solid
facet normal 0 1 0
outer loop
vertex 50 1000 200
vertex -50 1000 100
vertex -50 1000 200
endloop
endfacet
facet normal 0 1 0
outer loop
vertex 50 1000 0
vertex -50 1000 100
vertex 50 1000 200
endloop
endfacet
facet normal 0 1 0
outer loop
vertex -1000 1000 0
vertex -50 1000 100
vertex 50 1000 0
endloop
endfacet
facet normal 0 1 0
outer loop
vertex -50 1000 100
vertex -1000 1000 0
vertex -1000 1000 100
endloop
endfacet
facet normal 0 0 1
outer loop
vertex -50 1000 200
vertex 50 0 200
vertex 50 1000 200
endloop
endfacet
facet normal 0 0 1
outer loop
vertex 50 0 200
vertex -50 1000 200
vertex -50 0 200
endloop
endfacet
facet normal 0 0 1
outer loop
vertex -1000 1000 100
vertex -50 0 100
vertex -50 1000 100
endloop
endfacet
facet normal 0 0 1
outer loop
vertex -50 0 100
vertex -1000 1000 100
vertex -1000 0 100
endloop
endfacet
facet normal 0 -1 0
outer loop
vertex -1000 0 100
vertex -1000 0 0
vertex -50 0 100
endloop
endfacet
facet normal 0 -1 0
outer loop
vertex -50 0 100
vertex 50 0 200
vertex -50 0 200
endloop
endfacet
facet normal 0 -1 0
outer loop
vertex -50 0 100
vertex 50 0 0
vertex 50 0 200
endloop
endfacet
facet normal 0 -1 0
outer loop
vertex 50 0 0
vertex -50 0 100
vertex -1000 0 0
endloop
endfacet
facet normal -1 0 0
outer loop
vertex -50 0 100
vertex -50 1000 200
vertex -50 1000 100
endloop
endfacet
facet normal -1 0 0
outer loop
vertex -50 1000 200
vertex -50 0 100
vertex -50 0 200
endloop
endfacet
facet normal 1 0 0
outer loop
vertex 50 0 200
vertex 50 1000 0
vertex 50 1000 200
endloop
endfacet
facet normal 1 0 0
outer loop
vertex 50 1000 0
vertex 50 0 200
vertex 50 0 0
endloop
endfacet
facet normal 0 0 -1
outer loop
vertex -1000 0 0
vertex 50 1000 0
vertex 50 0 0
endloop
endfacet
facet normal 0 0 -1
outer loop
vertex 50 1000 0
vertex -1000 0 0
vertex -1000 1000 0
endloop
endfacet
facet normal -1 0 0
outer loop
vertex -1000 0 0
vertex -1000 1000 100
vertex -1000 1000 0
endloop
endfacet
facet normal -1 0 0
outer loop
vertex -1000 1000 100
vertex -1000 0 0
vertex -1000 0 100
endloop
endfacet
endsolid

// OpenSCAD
// file: ../../libs/basic-dims.scad
unit = 1000;

section_width = unit;
section_height = unit * 2;
section_thickness = unit * 0.1;

rt = sqrt(2);

//  -- Notes --
//  Z is UP
//  X is FORWARD (out of the screen)
// file: ../../libs/templates/t_flat-roof.scad
include <../basic-dims.scad>

flat_roof_wall_offset = section_thickness/2;

module flat_roof_straight() {
    rotate([0, 0, 90])
    translate([0, -flat_roof_wall_offset, 0])
    union() {
        translate([0, 0, section_thickness])
        cube([section_width, section_thickness, section_thickness]);
        cube([section_width, section_width + flat_roof_wall_offset, section_thickness]);
    }
}

module flat_roof_corner() {
    rotate([0, 0, 90])
    translate([-flat_roof_wall_offset, -flat_roof_wall_offset, 0])
    union() {
        translate([0, 0, section_thickness]) {
            cube([section_width + flat_roof_wall_offset, section_thickness, section_thickness]);
            cube([section_thickness, section_width + flat_roof_wall_offset, section_thickness]);
        }
        cube([
                section_width + flat_roof_wall_offset,
                section_width + flat_roof_wall_offset,
                section_thickness
            ]);
    }
}

module flat_roof_diagonal() {
    corrected_width = section_width + flat_roof_wall_offset;

    rotate([0, 0, 180])
    translate([-flat_roof_wall_offset, -flat_roof_wall_offset - section_width, 0])
    union() {
        linear_extrude(section_thickness)
        polygon([
            [0, corrected_width],
            [corrected_width, corrected_width],
            [corrected_width, 0]
        ]);

        translate([0, 0, section_thickness])
        linear_extrude(section_thickness)
        polygon([
            [0, corrected_width],
            [section_thickness, corrected_width],
            [corrected_width, section_thickness],
            [corrected_width, 0]
        ]);
    }
}

module flat_roof_square() {
    translate([-section_width, 0, 0])
    cube([section_width, section_width, section_thickness]);
}
// main file
include <../../libs/templates/t_flat-roof.scad>

flat_roof_straight();
